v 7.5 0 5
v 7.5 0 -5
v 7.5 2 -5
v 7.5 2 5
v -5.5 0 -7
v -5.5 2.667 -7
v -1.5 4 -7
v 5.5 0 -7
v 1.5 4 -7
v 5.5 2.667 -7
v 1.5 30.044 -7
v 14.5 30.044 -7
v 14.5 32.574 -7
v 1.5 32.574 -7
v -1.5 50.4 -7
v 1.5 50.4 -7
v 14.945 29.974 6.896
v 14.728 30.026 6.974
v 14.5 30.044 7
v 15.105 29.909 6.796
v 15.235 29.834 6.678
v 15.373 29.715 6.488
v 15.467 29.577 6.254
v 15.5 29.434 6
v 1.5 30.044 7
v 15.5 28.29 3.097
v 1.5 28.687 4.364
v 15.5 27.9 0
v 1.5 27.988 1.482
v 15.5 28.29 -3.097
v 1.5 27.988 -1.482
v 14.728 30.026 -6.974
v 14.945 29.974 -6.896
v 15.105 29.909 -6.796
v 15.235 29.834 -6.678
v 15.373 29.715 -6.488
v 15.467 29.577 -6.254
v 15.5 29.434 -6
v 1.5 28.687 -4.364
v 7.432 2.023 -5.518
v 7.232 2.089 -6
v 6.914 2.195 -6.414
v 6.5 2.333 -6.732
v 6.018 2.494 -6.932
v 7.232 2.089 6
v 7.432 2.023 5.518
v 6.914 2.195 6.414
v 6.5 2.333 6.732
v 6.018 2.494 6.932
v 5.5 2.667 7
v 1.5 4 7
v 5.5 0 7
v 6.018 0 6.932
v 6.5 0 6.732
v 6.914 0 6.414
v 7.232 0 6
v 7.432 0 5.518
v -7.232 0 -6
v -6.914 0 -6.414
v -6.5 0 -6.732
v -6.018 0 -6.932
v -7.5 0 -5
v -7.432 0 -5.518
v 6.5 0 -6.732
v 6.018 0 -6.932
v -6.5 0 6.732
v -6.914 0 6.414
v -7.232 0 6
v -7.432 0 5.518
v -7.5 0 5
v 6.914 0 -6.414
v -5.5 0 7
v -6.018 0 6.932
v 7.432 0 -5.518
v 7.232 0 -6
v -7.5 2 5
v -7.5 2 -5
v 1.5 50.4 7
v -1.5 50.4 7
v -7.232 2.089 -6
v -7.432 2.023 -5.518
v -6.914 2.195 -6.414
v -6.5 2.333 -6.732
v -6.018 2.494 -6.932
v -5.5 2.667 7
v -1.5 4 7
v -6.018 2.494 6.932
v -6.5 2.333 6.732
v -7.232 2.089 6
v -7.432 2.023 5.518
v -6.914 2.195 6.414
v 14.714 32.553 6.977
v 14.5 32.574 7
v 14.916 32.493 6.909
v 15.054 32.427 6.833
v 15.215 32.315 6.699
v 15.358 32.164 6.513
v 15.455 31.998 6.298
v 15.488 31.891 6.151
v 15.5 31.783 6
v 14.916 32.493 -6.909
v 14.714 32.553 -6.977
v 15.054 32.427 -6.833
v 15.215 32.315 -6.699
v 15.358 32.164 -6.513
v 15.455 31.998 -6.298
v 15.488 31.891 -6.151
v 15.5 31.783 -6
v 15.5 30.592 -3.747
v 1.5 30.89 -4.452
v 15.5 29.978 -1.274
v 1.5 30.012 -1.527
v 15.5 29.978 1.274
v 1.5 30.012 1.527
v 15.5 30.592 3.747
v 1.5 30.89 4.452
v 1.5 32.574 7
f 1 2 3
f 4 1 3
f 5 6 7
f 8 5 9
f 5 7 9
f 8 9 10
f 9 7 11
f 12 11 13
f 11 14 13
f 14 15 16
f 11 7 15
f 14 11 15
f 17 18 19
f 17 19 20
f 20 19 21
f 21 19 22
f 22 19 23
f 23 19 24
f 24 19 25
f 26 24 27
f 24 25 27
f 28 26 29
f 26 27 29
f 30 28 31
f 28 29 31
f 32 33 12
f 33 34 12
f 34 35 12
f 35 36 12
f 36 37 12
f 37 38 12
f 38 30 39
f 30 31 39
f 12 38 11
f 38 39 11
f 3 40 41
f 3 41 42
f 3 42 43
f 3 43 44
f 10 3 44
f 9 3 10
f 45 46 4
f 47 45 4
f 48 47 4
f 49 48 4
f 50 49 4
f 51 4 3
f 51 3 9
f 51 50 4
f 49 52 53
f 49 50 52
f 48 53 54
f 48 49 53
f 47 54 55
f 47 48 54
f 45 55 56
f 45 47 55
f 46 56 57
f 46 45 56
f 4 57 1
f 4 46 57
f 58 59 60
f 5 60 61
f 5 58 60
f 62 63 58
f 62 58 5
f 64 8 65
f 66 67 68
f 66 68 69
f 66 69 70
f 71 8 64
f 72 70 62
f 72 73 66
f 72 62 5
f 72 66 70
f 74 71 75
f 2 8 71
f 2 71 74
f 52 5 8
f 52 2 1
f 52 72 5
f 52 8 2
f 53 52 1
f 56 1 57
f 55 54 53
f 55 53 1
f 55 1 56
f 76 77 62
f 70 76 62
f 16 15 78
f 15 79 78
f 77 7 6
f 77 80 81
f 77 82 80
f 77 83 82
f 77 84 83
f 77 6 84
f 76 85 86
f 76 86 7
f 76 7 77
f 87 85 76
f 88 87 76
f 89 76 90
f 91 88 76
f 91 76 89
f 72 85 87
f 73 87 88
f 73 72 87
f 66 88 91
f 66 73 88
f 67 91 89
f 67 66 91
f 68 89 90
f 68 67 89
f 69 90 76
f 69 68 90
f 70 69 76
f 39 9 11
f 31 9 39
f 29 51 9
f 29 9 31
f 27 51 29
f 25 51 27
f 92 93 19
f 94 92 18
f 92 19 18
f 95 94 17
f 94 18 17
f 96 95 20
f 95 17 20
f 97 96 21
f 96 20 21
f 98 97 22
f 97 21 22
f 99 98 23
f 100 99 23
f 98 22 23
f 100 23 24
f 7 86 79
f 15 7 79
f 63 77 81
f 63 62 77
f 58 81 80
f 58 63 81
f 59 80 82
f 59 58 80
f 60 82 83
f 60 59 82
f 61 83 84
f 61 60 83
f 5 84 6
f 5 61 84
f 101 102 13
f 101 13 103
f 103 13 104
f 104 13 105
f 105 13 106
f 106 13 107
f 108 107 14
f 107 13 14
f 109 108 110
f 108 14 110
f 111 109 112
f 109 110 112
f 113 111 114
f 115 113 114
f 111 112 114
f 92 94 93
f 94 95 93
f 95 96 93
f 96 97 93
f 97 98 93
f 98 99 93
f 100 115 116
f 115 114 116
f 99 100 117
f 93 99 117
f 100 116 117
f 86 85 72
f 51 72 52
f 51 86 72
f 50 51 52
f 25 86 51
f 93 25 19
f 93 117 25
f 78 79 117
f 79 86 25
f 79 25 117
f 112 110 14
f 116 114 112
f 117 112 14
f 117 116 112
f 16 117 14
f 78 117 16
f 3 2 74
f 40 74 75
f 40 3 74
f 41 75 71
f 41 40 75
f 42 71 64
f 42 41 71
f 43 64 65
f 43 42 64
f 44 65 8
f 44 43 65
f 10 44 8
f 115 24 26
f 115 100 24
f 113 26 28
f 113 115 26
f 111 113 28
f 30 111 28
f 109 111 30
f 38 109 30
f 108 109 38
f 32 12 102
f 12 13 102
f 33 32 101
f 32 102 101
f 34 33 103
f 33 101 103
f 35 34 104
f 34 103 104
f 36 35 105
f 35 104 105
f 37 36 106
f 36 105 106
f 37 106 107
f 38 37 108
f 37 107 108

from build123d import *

# Parameters (mm, degrees)
ESBO_O1_W                = 3
ESBO_O1_H                = 50.4
RESSALTO_EXTRUS_O1_DEPTH = 7
FILETE1_R                = 2
RESSALTO_EXTRUS_O2_DEPTH = 14
FILETE2_R                = 1


with BuildPart() as part:
    # Esboço1 → Ressalto-extrusão1 (new body, symmetric)
    with BuildSketch(Plane.XY):
        with Locations((0, 25.2)):
            Rectangle(ESBO_O1_W, ESBO_O1_H)
        Polygon((-7.5, 0), (-1.5, 0), (-1.5, 4), (-7.5, 2), align=None)
        Polygon((1.5, 4), (1.5, 0), (7.5, 0), (7.5, 2), align=None)
    extrude(amount=RESSALTO_EXTRUS_O1_DEPTH, both=True)

    # Filete1
    filete1_edges = [part.edges().sort_by_distance(p)[0] for p in [
        (-7.5, 1, -7),
        (7.5, 1, -7),
        (7.5, 1, 7),
        (-7.5, 1, 7),
    ]]
    fillet(filete1_edges, radius=FILETE1_R)

    # Esboço3 → Ressalto-extrusão2 (add)
    with BuildSketch(Plane(origin=(1.5, 0, 0), x_dir=(0, 0, -1), z_dir=(1, 0, 0))):
        with BuildLine():
            Line((-7, 32.573762079), (-7, 30.043842411))
            ThreePointArc((-7, 30.043842411), (0, 27.9), (7, 30.043842411))
            Line((7, 30.043842411), (7, 32.573762079))
            ThreePointArc((7, 32.573762079), (0, 29.9), (-7, 32.573762079))
        make_face()
    extrude(amount=RESSALTO_EXTRUS_O2_DEPTH)

    # Filete2
    filete2_edges = [part.edges().sort_by_distance(p)[0] for p in [
        (15.5, 31.308802245, 7),
        (15.5, 31.308802245, -7),
    ]]
    fillet(filete2_edges, radius=FILETE2_R)


solid = part.part
